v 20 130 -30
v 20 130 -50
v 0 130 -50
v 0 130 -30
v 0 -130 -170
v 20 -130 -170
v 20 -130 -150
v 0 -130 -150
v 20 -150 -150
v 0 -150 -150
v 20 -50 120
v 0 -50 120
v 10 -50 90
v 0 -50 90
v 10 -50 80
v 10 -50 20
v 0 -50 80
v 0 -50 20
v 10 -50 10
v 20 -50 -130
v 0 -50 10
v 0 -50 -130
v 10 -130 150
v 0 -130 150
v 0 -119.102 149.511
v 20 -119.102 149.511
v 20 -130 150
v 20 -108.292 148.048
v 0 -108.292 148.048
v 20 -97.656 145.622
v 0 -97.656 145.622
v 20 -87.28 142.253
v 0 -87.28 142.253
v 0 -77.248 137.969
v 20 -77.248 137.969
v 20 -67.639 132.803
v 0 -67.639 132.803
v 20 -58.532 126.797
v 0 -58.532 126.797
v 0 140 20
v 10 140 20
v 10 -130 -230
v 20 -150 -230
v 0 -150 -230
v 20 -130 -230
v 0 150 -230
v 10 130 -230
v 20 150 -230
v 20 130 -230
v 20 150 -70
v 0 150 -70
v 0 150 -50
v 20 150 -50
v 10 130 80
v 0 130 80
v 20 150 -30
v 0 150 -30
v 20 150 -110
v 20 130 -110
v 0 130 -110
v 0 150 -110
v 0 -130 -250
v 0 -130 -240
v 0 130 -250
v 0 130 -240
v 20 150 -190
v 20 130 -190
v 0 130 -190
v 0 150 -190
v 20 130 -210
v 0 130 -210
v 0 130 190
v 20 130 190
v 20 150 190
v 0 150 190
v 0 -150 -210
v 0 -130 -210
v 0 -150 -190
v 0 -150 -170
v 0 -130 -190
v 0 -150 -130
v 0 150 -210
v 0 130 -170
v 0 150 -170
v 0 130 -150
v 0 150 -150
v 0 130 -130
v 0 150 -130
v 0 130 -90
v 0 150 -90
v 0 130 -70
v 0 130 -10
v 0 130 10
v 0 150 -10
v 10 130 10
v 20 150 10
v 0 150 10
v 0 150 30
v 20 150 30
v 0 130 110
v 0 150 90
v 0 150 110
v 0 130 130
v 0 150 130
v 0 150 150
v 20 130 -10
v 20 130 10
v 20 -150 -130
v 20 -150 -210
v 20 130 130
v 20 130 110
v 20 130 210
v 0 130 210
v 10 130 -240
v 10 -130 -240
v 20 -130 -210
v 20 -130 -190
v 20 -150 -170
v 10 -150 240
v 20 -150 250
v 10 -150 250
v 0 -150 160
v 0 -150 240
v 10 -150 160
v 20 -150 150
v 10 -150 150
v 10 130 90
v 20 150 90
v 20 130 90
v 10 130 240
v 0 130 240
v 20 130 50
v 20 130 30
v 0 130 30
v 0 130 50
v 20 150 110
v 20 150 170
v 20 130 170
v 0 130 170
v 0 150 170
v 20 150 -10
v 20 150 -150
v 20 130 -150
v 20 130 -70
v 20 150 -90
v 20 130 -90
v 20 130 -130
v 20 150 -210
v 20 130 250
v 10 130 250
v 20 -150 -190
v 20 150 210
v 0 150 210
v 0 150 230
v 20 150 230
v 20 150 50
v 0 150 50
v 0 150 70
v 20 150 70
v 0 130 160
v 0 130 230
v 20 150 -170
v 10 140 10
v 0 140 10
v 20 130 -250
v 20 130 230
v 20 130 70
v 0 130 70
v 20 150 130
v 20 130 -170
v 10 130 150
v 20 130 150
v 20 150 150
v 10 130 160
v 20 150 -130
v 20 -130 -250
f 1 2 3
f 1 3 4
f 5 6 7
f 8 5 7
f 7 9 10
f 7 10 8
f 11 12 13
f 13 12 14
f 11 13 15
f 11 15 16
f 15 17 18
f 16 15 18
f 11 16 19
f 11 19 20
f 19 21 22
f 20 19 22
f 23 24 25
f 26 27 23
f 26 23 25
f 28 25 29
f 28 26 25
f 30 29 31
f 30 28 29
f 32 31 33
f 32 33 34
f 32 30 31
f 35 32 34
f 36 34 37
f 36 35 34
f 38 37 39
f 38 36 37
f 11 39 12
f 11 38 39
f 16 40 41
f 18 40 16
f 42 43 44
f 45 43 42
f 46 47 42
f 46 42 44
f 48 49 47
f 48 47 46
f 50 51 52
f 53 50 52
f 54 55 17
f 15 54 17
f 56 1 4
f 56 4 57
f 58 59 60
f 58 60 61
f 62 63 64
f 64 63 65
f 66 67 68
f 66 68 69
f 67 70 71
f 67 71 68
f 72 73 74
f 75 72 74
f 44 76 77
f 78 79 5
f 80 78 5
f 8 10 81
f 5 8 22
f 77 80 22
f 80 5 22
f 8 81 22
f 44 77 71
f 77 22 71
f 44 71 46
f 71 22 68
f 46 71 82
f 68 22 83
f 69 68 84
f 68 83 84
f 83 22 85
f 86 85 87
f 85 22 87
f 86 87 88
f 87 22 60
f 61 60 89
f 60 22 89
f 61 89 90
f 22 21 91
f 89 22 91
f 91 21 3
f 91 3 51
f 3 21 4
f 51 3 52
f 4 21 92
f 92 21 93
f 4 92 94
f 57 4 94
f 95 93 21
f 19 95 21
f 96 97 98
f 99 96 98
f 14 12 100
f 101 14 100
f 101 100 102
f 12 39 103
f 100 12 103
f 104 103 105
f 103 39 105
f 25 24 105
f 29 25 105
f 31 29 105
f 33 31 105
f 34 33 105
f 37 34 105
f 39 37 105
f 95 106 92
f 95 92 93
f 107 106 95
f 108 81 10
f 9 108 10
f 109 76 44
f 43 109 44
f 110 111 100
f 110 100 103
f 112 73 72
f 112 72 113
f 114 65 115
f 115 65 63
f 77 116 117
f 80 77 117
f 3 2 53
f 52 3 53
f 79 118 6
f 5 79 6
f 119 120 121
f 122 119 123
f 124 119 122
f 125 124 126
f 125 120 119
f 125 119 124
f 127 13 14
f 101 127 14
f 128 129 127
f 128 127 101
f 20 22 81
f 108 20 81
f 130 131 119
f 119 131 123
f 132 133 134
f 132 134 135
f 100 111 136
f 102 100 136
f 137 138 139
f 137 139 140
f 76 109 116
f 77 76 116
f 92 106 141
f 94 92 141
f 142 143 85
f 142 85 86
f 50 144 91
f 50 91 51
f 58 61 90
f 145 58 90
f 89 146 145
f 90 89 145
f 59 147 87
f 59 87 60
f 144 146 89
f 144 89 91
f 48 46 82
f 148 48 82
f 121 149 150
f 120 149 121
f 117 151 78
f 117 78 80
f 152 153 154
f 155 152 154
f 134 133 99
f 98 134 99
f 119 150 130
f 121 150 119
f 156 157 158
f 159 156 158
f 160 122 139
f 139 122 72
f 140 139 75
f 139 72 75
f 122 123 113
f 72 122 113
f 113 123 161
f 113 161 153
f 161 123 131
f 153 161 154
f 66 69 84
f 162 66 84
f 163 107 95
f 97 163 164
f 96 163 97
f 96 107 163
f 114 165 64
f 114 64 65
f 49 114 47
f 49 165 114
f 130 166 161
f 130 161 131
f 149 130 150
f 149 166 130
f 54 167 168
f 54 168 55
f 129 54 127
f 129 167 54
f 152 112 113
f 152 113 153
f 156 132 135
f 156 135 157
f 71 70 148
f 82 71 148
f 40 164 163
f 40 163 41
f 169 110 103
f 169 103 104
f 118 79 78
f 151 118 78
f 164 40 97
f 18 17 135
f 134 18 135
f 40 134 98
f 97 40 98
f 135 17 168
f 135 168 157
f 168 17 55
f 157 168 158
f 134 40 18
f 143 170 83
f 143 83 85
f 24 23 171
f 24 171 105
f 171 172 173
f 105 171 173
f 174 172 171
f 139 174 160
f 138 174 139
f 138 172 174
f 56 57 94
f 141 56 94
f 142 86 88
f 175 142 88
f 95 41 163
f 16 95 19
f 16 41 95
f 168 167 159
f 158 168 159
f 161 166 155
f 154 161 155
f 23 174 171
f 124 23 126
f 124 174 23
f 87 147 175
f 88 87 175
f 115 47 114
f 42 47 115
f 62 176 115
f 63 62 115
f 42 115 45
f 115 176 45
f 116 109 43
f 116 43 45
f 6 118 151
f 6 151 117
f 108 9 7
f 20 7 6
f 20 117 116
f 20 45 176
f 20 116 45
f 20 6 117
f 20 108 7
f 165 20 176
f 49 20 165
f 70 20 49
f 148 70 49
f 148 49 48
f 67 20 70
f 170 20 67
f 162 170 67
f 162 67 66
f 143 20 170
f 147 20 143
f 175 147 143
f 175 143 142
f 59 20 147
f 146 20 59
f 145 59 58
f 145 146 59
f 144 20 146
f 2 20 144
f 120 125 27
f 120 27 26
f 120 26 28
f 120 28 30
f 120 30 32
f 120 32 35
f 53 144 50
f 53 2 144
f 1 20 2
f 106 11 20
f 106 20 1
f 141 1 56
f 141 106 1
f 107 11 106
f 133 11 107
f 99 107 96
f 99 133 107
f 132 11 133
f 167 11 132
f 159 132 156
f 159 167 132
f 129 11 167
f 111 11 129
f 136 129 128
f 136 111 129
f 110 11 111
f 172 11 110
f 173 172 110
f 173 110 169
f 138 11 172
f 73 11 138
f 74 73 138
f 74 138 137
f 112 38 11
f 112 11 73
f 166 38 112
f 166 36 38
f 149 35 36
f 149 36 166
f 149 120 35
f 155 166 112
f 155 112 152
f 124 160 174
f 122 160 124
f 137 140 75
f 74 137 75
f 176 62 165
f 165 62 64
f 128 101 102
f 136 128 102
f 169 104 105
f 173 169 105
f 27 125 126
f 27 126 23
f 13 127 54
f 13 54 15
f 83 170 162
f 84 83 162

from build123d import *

# Parameters (mm, degrees)
F1_DEPTH  = 20
F3_DEPTH  = 20
F4_W      = 20
F4_H      = 20
F5_DEPTH  = 20
F6_W      = 20
F6_H      = 20
F7_DEPTH  = 20
F8_W      = 260
F8_H      = 10
F9_DEPTH  = 10
F10_W     = 300
F10_H     = 10
F10_W_2   = 280
F11_DEPTH = 10


with BuildPart() as f1:
    # F0 (on Right) → F1 (new body)
    with BuildSketch(Plane.YZ):
        Polygon((-150, -250), (150, -250), (150, 250), (-50, 250), (-50, -130), (-150, -130), align=None)
    extrude(amount=F1_DEPTH)

    # F2 (on face) → F3 (join)
    with BuildSketch(Plane.YZ.offset(20)):
        with BuildLine():
            Line((-50, 120), (-50, 250))
            Line((-50, 250), (-150, 250))
            Line((-150, 250), (-150, 150))
            Line((-150, 150), (-130, 150))
            ThreePointArc((-130, 150), (-87.279981, 142.253383), (-50, 120))
        make_face()
    extrude(amount=-F3_DEPTH)

    # F4 (on face) → F5 (cut, through all)
    with BuildSketch(Plane.YZ.offset(20)):
        with Locations((140, -200)):
            Rectangle(F4_W, F4_H)
        with Locations((140, -160)):
            Rectangle(F4_W, F4_H)
        with Locations((140, -120)):
            Rectangle(F4_W, F4_H)
        with Locations((140, -80)):
            Rectangle(F4_W, F4_H)
        with Locations((140, -40)):
            Rectangle(F4_W, F4_H)
        with Locations((140, 0)):
            Rectangle(F4_W, F4_H)
        with Locations((140, 40)):
            Rectangle(F4_W, F4_H)
        with Locations((140, 80)):
            Rectangle(F4_W, F4_H)
        with Locations((140, 120)):
            Rectangle(F4_W, F4_H)
        with Locations((140, 160)):
            Rectangle(F4_W, F4_H)
        with Locations((140, 200)):
            Rectangle(F4_W, F4_H)
        with Locations((140, 240)):
            Rectangle(F4_W, F4_H)
        with Locations((140, -240)):
            Rectangle(F4_W, F4_H)
    extrude(amount=-F5_DEPTH, mode=Mode.SUBTRACT)

    # F6 (on face) → F7 (cut, through all)
    with BuildSketch(Plane.YZ.offset(20)):
        with Locations((-140, -200)):
            Rectangle(F6_W, F6_H)
        with Locations((-140, -160)):
            Rectangle(F6_W, F6_H)
        with Locations((-140, -240)):
            Rectangle(F6_W, F6_H)
    extrude(amount=-F7_DEPTH, mode=Mode.SUBTRACT)

    # F8 (on face) → F9 (cut)
    with BuildSketch(Plane(origin=(0, 0, 0), x_dir=(0, -1, 0), z_dir=(-1, 0, 0))):
        with Locations((0, -235)):
            Rectangle(F8_W, F8_H)
    extrude(amount=-F9_DEPTH, mode=Mode.SUBTRACT)

    # F10 (on face) → F11 (cut)
    with BuildSketch(Plane(origin=(0, 0, 0), x_dir=(0, -1, 0), z_dir=(-1, 0, 0))):
        with Locations((0, 245)):
            Rectangle(F10_W, F10_H)
        with Locations((0, 155)):
            Rectangle(F10_W, F10_H)
        with Locations((0, 85)):
            Rectangle(F10_W_2, F10_H)
        with Locations((0, 15)):
            Rectangle(F10_W_2, F10_H)
    extrude(amount=-F11_DEPTH, mode=Mode.SUBTRACT)


solid = f1.part
